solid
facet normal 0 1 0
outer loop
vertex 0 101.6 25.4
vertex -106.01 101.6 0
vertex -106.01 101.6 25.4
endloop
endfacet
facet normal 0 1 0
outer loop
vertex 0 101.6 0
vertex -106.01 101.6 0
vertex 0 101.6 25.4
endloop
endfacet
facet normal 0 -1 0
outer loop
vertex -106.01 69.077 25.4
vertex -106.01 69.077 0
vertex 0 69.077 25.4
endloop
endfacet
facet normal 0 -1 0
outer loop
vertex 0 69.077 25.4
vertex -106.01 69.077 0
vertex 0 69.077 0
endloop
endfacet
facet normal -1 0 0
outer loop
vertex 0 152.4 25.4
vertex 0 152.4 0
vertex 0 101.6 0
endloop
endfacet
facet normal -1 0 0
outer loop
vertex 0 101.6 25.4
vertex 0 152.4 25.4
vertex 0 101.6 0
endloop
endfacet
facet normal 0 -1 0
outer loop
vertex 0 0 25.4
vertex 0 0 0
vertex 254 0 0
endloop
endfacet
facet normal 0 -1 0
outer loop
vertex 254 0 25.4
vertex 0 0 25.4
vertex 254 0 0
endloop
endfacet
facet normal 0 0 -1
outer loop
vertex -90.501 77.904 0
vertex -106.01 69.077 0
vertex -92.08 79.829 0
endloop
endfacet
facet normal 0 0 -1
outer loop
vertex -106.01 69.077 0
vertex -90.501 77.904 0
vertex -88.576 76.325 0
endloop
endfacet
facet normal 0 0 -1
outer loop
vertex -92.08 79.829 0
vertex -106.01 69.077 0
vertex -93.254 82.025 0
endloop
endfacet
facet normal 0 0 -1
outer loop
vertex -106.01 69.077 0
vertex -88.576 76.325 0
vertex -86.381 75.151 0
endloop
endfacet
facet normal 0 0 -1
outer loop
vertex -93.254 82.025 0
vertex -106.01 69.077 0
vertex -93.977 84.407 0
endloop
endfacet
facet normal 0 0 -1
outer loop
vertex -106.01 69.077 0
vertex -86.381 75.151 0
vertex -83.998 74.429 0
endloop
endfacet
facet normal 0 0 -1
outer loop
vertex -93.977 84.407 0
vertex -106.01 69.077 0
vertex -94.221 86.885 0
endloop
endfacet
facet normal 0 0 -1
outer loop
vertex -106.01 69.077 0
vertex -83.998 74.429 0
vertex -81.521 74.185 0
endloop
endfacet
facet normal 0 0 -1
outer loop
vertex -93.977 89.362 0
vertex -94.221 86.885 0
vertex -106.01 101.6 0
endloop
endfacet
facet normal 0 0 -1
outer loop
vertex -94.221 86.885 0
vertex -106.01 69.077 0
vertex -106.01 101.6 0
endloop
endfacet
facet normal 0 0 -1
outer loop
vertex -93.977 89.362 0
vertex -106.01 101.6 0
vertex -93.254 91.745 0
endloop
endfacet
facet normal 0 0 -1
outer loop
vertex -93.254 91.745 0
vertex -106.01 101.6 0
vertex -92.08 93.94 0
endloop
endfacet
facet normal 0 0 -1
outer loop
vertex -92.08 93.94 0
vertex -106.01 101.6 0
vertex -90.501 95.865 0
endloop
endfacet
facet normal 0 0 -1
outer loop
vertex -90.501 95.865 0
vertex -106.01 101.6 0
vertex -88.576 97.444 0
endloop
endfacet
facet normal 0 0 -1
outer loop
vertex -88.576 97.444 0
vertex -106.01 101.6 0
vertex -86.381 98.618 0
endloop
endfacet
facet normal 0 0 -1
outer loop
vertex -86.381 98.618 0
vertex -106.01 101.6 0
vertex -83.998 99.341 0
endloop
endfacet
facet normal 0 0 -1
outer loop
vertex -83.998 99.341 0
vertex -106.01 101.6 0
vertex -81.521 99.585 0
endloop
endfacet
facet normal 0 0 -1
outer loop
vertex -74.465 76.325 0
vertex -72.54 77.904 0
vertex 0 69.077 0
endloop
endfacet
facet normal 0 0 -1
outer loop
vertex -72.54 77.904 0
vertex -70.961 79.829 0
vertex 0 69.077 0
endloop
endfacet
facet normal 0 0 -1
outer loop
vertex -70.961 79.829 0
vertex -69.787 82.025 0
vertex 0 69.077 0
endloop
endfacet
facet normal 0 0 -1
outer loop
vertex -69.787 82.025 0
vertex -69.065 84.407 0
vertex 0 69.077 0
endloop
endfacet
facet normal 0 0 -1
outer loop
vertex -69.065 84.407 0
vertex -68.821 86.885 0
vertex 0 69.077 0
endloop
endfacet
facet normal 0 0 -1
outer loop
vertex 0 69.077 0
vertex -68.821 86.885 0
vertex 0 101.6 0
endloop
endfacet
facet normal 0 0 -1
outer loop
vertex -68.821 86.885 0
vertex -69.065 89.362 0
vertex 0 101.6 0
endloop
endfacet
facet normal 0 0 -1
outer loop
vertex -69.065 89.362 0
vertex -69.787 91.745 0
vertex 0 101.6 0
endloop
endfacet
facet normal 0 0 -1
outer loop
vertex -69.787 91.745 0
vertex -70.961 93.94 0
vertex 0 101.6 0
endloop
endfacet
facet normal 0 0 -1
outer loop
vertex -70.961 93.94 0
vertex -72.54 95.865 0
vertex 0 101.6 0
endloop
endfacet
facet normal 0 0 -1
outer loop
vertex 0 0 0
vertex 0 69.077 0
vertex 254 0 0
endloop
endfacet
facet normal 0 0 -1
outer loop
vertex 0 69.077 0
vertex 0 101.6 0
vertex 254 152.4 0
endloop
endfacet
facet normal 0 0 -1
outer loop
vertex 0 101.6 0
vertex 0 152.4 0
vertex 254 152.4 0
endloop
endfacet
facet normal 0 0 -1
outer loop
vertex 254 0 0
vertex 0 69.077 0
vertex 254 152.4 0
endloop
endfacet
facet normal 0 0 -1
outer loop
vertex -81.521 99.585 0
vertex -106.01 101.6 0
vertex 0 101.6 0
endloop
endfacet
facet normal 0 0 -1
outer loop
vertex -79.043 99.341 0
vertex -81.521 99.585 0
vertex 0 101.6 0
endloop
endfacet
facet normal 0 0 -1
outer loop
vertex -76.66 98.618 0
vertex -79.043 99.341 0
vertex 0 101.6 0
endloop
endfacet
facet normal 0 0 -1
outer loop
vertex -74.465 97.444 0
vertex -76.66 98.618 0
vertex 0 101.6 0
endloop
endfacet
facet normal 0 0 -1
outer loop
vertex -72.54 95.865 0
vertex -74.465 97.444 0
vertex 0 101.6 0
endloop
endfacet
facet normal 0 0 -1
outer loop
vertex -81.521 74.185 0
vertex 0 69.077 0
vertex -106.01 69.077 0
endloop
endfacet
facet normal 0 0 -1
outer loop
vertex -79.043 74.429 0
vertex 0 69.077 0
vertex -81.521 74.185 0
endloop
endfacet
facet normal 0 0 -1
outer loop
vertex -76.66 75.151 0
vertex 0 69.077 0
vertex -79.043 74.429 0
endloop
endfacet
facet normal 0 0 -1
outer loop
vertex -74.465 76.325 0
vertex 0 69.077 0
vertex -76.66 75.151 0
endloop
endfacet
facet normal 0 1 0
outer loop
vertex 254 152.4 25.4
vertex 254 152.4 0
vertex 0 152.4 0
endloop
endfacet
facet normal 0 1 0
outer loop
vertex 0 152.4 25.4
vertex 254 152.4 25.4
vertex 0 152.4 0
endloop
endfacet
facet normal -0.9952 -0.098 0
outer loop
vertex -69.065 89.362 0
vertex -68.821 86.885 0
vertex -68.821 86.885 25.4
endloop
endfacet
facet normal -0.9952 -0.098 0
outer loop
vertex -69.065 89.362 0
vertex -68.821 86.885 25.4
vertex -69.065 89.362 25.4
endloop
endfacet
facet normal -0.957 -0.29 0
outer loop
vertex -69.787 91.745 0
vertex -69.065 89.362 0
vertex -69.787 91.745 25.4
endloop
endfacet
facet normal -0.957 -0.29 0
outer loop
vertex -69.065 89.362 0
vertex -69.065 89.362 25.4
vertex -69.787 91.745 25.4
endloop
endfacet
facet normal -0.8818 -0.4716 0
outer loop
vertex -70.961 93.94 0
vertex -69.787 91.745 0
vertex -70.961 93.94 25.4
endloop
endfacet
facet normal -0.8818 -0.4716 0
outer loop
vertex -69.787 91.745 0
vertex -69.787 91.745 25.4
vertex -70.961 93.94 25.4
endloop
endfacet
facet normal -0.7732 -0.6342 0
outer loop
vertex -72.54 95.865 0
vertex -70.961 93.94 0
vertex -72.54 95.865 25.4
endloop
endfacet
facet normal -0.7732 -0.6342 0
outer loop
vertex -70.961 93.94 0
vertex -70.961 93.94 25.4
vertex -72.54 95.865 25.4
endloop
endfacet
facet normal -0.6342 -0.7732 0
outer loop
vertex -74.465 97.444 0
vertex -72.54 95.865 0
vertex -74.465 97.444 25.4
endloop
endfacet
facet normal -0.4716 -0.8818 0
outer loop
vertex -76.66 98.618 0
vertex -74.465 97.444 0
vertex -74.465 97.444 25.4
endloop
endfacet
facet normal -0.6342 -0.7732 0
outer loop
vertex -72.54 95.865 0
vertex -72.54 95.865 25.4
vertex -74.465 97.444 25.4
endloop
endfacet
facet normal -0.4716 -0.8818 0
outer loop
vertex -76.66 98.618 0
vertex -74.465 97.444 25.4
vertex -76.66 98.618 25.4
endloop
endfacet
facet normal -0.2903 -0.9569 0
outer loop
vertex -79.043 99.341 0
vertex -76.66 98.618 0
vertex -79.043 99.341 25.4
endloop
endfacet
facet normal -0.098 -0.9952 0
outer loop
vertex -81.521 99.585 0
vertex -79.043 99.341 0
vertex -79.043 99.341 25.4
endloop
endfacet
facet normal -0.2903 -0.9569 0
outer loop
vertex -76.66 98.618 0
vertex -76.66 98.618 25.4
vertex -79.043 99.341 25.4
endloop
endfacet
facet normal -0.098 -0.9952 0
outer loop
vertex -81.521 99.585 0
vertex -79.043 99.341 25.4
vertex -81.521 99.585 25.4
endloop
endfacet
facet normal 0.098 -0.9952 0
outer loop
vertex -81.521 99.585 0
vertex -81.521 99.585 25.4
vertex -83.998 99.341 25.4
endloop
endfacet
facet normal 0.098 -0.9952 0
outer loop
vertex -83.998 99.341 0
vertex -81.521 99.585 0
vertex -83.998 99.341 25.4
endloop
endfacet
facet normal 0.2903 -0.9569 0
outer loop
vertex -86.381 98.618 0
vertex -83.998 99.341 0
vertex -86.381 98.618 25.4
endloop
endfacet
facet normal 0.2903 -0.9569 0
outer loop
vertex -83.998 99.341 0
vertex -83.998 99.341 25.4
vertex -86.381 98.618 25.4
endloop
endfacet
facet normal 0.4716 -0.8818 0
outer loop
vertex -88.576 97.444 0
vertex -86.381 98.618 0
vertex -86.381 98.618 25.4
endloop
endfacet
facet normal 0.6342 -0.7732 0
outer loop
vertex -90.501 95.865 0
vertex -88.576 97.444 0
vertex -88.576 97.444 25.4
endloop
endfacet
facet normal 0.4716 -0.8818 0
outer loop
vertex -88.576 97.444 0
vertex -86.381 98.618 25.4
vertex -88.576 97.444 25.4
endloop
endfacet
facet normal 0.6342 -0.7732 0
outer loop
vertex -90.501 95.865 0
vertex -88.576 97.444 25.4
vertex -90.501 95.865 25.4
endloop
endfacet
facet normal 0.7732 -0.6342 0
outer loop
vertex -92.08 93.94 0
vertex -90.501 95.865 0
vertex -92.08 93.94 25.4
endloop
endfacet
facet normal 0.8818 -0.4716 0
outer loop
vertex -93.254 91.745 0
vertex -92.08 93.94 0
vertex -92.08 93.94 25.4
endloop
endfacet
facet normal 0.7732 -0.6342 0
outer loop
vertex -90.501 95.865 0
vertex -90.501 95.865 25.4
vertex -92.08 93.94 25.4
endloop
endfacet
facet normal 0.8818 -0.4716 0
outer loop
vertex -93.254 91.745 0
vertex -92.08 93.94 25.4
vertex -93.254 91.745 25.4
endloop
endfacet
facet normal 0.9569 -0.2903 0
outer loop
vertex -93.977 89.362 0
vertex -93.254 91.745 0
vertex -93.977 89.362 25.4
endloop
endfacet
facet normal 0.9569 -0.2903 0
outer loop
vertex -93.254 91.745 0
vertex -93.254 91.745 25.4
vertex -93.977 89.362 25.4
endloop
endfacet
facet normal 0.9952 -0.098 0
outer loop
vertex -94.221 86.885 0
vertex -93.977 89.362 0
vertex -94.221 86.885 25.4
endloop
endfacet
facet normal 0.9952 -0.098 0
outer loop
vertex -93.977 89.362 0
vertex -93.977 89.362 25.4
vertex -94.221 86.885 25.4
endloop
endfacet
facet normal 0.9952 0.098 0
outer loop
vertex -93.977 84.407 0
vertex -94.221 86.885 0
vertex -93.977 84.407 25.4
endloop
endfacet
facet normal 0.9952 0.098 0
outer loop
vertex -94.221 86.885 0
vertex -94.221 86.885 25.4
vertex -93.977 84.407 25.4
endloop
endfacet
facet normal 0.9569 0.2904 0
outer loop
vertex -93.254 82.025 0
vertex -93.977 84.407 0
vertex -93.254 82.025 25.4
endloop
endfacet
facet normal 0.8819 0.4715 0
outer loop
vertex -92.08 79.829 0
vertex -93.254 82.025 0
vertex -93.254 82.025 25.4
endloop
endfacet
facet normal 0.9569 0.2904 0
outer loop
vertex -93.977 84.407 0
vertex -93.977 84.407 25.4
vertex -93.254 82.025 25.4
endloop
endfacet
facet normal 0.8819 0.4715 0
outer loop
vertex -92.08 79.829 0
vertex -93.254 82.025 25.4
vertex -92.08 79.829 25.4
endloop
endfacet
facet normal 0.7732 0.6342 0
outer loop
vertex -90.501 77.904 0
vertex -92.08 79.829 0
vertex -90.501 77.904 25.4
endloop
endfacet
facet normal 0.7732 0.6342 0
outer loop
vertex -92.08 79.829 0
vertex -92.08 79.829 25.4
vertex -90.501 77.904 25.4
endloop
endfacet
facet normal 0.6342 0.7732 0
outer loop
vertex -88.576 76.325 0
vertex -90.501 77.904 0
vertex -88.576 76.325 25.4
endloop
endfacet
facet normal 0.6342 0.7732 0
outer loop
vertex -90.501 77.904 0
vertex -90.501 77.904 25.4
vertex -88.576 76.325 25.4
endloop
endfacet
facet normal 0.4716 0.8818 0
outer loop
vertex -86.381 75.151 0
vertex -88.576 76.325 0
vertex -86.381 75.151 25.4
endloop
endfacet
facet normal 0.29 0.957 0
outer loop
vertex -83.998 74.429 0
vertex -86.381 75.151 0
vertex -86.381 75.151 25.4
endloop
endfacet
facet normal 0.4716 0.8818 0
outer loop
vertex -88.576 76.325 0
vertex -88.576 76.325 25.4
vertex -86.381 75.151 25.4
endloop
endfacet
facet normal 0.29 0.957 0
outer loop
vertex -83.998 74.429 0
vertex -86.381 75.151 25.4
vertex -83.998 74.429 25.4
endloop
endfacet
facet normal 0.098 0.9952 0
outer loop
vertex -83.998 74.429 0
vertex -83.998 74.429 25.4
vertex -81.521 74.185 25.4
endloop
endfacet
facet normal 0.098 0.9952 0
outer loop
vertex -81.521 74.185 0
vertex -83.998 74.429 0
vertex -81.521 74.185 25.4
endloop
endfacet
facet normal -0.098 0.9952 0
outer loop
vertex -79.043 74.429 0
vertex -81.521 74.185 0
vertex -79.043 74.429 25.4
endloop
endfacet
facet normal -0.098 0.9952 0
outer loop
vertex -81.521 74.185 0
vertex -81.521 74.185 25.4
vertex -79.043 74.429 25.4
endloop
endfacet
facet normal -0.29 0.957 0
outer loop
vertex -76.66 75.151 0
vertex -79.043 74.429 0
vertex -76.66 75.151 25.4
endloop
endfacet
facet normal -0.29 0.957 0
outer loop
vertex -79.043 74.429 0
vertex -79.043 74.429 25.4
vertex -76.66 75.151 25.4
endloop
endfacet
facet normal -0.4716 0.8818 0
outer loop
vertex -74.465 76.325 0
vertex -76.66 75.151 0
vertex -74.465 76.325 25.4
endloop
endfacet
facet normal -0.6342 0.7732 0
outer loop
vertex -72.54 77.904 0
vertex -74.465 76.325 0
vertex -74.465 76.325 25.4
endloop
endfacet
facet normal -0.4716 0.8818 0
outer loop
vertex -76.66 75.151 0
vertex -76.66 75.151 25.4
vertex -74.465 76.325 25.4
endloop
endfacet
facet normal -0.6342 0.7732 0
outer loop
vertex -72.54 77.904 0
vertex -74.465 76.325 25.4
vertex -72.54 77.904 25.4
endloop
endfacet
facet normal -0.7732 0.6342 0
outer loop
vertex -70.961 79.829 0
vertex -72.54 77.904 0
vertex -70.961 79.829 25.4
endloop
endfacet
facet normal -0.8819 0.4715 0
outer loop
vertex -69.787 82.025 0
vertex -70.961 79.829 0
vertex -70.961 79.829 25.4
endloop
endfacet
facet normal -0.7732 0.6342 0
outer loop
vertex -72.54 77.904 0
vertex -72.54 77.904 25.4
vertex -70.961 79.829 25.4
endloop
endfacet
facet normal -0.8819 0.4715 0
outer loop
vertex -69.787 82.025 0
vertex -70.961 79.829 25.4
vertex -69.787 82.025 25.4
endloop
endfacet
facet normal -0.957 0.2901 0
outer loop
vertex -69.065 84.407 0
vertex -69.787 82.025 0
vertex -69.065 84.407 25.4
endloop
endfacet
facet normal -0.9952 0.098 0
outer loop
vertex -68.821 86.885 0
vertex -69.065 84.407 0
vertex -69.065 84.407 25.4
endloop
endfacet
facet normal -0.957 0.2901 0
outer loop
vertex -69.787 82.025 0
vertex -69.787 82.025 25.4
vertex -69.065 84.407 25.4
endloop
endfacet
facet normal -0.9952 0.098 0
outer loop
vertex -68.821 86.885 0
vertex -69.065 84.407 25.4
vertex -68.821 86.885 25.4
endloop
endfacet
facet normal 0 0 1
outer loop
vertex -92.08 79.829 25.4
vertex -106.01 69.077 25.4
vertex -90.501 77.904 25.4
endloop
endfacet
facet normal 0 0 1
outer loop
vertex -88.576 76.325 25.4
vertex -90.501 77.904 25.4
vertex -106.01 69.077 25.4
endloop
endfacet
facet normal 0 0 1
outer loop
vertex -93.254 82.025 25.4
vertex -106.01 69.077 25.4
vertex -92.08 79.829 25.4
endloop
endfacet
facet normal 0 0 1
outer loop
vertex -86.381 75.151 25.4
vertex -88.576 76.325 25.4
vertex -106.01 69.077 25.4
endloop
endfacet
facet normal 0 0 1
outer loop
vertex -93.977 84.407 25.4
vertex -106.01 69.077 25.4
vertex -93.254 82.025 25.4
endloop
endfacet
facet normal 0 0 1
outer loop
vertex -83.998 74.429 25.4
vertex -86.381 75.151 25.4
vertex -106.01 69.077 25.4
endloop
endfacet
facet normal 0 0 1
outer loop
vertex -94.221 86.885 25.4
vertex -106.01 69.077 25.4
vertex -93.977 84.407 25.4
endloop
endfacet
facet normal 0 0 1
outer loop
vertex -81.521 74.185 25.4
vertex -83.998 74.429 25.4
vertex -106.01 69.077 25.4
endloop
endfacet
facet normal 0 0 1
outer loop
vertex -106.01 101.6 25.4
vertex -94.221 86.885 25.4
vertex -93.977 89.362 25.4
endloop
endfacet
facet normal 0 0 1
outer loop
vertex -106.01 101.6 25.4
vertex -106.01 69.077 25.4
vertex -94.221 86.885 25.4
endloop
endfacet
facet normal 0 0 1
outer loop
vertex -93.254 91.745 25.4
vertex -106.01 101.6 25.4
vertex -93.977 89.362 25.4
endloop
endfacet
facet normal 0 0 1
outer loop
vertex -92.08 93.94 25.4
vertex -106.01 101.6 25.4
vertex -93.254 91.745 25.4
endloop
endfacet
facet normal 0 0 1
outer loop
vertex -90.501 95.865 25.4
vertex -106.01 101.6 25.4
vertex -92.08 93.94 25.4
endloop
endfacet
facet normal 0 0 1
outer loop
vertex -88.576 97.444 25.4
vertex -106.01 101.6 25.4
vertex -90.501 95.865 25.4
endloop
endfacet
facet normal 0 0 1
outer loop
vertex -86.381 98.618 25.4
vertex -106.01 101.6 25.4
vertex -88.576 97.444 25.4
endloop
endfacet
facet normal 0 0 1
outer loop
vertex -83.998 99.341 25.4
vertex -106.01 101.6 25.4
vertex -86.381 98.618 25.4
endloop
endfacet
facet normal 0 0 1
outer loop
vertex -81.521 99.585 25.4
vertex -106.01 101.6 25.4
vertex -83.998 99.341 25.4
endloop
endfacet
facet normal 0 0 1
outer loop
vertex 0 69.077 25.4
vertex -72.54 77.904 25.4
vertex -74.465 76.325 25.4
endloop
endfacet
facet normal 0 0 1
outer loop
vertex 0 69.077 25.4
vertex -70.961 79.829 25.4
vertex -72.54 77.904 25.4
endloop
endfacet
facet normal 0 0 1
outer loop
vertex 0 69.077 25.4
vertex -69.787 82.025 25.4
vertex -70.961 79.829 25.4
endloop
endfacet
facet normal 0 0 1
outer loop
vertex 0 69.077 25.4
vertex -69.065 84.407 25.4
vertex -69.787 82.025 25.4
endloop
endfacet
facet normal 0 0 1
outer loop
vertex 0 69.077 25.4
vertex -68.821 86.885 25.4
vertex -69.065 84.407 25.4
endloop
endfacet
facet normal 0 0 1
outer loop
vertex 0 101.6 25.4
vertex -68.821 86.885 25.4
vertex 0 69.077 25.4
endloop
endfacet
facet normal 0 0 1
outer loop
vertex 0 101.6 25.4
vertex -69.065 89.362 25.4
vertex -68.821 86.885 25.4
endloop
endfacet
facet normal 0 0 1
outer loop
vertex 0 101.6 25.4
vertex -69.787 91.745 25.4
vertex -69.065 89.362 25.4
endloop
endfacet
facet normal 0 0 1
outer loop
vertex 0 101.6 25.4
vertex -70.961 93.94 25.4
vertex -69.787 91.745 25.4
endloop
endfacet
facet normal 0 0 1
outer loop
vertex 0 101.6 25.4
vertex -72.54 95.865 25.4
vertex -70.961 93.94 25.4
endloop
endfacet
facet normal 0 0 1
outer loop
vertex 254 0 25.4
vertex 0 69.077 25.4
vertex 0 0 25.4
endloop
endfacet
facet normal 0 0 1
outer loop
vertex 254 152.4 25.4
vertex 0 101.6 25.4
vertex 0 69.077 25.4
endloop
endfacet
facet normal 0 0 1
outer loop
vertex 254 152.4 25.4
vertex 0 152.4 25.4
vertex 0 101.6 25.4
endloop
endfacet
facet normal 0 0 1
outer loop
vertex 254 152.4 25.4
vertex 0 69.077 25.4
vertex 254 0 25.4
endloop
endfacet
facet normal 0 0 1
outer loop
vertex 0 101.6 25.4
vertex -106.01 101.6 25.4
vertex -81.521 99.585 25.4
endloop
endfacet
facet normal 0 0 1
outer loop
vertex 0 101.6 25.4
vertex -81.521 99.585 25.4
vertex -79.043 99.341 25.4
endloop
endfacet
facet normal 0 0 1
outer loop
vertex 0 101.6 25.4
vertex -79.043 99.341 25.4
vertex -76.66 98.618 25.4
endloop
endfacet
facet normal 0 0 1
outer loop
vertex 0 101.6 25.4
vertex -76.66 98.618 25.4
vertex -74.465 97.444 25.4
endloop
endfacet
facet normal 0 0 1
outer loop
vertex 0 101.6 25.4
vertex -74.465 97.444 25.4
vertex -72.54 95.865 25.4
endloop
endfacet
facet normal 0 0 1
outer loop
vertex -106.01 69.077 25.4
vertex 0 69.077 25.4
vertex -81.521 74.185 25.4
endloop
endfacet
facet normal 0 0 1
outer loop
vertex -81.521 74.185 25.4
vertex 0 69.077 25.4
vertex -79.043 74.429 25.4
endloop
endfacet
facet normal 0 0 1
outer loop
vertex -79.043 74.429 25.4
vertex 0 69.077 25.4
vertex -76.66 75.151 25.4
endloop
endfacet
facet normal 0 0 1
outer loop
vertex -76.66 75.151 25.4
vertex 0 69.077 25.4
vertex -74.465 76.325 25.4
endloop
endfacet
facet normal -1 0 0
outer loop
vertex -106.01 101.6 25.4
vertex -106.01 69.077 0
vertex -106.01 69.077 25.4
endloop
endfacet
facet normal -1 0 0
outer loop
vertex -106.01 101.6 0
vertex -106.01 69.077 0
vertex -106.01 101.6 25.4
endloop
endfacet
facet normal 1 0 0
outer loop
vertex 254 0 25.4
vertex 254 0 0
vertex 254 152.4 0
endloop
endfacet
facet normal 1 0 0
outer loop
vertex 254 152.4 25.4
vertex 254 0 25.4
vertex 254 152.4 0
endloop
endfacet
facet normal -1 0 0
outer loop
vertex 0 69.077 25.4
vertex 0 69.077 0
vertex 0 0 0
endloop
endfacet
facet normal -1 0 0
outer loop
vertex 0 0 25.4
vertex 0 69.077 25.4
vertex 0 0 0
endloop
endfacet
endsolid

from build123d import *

# Parameters (mm, degrees)
F0_W     = 106.009863
F0_H     = 32.523151
F1_DEPTH = 25.4
F2_R     = 12.7
F3_DEPTH = 25.4


with BuildPart() as f1:
    # F0 (on Top) → F1 (new body)
    with BuildSketch(Plane.XY):
        Polygon((0, 69.076849), (0, 0), (254, 0), (254, 152.4), (0, 152.4), (0, 101.6), align=None)
        with Locations((-53.004931, 85.338425)):
            Rectangle(F0_W, F0_H)
    extrude(amount=F1_DEPTH)

    # F2 (on face) → F3 (cut)
    with BuildSketch(Plane.XY.offset(25.4)):
        with Locations((-81.52055, 86.884722)):
            Circle(F2_R)
    extrude(amount=-F3_DEPTH, mode=Mode.SUBTRACT)


solid = f1.part
